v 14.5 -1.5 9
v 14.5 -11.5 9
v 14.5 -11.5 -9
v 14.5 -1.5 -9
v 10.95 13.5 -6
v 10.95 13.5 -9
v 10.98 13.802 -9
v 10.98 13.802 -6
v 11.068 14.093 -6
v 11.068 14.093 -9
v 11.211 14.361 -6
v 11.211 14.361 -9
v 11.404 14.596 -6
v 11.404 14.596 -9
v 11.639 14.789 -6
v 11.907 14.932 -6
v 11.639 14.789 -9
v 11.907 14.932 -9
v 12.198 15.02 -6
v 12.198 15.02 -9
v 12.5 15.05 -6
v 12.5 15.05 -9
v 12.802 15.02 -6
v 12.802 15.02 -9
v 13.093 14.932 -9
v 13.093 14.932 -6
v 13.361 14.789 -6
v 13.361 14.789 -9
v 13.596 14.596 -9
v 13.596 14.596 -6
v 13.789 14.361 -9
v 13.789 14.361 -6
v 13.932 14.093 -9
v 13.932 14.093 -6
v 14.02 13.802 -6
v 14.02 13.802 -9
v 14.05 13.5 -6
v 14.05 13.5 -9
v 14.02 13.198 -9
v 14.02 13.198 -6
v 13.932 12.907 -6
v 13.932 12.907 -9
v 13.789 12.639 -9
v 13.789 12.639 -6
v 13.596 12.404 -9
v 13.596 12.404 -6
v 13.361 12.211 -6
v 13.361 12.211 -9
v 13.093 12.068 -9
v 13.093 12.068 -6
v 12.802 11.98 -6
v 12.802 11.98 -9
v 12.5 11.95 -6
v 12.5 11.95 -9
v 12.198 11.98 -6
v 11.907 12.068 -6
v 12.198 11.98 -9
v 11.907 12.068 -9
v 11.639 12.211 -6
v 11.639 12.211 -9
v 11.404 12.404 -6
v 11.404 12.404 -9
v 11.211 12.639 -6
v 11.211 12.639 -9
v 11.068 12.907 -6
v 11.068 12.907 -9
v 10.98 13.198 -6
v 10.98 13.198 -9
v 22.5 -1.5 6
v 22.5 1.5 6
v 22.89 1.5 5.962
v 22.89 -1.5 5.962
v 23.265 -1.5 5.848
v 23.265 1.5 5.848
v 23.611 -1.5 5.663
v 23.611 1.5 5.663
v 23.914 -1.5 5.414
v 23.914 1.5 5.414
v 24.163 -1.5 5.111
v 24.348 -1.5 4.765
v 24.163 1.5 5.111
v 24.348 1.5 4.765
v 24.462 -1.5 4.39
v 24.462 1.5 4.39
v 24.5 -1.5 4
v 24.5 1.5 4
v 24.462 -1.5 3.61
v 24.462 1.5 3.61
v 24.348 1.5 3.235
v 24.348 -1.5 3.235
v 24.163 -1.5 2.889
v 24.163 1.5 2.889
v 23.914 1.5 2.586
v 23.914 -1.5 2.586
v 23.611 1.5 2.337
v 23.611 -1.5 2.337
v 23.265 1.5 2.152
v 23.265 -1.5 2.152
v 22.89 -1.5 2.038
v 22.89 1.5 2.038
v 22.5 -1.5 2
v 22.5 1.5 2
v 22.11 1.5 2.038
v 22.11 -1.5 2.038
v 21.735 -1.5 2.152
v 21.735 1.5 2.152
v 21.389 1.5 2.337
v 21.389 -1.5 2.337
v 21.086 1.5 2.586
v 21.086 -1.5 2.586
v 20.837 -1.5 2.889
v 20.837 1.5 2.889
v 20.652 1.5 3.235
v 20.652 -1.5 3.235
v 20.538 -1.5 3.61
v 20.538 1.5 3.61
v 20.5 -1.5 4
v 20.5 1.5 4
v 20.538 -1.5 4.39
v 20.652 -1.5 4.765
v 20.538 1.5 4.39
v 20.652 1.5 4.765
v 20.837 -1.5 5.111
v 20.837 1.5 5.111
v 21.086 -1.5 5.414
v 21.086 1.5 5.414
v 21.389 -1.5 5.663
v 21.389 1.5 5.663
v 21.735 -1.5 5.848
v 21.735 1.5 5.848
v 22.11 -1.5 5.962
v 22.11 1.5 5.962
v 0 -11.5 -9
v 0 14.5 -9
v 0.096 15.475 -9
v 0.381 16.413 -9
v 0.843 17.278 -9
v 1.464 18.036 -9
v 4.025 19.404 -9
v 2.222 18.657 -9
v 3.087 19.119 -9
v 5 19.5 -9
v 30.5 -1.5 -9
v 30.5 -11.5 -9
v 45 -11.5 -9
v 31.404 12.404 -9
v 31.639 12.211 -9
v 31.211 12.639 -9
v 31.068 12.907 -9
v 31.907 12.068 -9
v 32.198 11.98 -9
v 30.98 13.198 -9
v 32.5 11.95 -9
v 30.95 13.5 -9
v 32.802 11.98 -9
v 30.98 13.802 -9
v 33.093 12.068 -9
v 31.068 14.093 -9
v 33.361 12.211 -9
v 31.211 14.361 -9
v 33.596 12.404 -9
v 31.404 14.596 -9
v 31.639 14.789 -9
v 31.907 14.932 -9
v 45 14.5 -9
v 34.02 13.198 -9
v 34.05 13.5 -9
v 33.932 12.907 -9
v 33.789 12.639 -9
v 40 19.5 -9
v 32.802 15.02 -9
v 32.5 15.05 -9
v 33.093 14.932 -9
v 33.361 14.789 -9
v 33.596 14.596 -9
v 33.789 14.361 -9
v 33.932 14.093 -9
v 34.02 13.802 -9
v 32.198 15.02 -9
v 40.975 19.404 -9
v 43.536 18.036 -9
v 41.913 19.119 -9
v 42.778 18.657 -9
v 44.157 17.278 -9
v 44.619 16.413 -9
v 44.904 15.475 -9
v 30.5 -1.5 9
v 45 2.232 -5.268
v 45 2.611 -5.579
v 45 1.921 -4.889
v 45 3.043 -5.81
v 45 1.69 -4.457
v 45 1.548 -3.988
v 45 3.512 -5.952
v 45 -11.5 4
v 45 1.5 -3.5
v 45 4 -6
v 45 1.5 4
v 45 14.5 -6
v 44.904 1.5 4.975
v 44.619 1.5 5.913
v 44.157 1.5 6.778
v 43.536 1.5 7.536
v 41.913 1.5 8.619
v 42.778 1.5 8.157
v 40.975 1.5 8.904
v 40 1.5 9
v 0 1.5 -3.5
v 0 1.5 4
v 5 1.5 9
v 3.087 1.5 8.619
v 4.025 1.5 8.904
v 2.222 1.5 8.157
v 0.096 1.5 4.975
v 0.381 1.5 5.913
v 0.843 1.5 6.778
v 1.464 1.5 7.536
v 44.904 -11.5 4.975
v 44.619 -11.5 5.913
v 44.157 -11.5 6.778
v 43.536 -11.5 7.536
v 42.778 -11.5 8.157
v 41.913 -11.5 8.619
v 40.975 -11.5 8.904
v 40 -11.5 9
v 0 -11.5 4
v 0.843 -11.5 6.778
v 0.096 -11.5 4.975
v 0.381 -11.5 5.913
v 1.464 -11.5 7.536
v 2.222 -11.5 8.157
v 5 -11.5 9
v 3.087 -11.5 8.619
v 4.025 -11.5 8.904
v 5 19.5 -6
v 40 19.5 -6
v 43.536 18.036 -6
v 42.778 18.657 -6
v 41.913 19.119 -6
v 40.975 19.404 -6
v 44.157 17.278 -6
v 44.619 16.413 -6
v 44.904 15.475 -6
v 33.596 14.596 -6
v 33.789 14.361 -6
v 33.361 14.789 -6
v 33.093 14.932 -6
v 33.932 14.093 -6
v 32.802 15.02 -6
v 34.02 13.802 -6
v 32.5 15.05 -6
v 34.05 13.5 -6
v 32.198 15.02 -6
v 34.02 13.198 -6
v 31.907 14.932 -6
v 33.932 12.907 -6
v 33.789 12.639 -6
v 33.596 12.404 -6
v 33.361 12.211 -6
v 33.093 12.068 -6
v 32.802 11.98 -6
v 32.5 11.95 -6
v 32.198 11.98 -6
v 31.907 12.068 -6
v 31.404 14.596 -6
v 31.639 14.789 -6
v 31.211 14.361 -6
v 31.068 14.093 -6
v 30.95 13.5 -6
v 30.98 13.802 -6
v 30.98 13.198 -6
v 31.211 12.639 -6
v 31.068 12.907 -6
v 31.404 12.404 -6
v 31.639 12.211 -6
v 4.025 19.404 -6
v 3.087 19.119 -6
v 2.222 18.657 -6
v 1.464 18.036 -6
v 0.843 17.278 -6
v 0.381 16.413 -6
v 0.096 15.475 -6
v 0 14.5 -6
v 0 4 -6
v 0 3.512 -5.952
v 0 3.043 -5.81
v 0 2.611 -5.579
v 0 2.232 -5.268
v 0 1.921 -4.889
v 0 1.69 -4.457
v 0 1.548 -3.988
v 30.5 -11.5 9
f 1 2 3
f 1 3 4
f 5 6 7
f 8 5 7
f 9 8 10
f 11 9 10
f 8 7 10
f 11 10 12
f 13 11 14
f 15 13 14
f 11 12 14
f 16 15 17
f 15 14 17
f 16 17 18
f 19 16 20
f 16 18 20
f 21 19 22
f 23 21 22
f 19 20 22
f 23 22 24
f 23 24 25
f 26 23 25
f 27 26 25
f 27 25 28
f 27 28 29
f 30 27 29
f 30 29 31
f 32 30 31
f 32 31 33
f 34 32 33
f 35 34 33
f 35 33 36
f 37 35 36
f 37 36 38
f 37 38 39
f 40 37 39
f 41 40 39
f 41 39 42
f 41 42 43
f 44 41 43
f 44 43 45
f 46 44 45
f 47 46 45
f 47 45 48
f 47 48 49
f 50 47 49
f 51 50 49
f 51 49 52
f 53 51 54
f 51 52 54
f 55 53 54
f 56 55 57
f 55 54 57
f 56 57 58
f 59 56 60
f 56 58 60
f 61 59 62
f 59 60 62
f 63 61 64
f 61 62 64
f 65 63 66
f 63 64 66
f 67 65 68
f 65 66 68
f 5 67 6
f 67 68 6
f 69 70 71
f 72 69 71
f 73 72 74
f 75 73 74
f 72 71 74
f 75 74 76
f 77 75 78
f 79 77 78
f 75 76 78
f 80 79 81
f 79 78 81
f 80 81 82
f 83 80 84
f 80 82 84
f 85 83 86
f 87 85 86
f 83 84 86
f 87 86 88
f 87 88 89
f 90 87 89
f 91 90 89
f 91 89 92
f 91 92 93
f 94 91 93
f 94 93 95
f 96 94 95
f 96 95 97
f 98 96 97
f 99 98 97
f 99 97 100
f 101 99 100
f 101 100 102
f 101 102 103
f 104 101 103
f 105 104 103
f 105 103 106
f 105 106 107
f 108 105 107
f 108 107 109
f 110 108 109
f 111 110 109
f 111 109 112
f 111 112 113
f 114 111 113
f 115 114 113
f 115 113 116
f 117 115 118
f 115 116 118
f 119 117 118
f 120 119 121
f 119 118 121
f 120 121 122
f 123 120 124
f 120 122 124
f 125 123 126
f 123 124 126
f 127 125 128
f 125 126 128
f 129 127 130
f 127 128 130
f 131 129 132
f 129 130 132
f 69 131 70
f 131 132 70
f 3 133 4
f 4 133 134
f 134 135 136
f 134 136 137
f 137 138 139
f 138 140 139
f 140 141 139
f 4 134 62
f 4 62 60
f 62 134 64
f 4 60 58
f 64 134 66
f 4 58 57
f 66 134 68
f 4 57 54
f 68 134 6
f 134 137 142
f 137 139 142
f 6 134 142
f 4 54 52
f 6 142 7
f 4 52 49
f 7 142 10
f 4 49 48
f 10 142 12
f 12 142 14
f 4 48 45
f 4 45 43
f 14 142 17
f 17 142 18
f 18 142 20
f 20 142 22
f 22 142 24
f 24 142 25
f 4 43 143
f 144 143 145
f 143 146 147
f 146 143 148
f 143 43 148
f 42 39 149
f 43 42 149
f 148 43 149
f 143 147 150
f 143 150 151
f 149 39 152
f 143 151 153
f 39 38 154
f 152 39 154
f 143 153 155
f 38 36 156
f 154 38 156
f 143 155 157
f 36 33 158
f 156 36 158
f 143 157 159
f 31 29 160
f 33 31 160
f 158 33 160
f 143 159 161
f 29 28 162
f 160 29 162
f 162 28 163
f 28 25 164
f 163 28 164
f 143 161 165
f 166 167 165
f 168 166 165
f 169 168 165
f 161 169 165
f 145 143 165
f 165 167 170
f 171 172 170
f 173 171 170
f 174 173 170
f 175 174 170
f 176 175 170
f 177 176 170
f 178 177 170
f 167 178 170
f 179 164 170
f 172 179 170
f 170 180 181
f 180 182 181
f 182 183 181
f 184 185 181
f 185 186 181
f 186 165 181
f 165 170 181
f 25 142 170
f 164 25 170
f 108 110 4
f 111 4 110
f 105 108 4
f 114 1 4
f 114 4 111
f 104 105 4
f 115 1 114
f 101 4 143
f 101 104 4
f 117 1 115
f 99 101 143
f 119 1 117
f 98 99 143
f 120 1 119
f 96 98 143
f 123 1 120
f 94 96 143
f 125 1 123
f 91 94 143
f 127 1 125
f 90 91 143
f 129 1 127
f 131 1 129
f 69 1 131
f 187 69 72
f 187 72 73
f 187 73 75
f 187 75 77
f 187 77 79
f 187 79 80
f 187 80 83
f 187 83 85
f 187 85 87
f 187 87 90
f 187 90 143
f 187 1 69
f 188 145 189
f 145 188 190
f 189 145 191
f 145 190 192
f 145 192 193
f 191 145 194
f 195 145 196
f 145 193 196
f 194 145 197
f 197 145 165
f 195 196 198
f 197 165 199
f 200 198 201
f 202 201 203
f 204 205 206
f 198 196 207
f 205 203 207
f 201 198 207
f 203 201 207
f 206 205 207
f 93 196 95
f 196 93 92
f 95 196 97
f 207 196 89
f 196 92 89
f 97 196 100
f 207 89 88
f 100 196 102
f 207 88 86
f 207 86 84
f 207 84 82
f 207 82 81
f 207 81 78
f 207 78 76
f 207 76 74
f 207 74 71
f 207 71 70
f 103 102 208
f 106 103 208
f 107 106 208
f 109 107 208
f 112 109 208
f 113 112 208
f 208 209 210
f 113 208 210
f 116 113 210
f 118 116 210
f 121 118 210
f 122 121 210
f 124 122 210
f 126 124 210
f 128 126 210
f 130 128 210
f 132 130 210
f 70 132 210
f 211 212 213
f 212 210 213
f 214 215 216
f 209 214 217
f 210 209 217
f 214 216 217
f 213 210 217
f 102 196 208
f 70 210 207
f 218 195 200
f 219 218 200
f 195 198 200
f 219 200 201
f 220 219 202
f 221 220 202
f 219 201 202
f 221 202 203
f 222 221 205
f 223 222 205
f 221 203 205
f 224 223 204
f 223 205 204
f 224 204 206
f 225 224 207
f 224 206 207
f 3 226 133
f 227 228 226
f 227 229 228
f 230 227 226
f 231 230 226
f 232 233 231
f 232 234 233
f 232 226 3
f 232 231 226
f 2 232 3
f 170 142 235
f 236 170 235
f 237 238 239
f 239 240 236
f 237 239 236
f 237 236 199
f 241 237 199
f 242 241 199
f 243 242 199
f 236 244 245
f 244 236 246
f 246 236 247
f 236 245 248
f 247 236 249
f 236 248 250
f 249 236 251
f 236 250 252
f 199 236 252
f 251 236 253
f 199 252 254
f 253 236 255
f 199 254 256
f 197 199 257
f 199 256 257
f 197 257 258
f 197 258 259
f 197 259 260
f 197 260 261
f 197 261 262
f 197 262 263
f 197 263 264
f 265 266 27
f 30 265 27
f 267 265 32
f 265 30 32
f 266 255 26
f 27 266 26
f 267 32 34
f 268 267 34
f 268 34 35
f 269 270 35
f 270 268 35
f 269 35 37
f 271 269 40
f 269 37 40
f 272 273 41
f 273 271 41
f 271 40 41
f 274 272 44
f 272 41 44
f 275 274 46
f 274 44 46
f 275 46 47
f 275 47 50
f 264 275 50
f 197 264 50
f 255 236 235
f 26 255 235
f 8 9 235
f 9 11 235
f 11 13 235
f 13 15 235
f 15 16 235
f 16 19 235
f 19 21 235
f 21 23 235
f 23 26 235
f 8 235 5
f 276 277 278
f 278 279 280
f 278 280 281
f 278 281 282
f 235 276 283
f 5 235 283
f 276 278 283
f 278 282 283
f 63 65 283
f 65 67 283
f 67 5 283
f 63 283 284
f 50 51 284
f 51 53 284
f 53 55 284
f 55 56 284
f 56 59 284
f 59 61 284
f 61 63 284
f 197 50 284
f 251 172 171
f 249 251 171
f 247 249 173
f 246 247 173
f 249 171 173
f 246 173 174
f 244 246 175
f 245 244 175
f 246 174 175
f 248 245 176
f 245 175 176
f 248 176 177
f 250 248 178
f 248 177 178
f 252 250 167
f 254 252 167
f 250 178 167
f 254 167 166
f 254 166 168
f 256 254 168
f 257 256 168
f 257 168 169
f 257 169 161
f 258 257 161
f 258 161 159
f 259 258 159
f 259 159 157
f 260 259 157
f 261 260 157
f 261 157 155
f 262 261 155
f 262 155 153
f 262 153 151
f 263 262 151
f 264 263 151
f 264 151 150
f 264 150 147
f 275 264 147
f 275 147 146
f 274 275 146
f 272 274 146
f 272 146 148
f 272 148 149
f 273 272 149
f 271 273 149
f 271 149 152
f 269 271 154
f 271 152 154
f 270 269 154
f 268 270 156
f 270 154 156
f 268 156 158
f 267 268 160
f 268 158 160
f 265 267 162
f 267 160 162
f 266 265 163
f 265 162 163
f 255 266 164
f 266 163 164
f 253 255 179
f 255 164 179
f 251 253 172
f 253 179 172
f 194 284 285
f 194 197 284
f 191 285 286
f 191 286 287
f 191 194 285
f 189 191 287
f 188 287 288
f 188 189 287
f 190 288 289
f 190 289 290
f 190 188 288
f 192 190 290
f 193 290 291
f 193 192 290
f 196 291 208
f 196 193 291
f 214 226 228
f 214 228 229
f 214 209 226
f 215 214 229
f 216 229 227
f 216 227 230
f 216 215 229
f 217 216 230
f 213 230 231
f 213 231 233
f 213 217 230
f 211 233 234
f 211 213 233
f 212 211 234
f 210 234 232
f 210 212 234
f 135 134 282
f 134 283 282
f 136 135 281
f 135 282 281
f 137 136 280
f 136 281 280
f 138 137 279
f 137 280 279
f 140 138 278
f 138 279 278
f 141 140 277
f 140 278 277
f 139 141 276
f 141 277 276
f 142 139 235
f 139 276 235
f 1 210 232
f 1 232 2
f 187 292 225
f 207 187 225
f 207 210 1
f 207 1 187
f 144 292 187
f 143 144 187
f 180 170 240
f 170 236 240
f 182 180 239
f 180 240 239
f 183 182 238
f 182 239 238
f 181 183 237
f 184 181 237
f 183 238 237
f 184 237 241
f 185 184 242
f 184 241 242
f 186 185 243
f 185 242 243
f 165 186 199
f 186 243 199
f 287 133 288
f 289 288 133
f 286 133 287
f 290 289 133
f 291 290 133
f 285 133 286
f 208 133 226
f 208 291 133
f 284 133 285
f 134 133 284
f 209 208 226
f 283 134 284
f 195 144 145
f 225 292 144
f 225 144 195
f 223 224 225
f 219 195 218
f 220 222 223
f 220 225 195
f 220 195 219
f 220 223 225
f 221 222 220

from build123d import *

# Parameters (mm, degrees)
SALIENTE_EXTRUIR1_DEPTH = 45
REDONDEO1_R             = 2.5
CROQUIS2_R              = 2
CORTAR_EXTRUIR1_DEPTH   = 50.295030175
CROQUIS3_R              = 1.55
CORTAR_EXTRUIR2_DEPTH   = 53.242224302
CROQUIS4_W              = 45
CROQUIS4_H              = 18
SALIENTE_EXTRUIR2_DEPTH = 10
REDONDEO3_R             = 5
CROQUIS5_W              = 16
CROQUIS5_H              = 10
CORTAR_EXTRUIR3_DEPTH   = 53.242224302
REDONDEO4_R             = 5


with BuildPart() as part:
    # Croquis1 → Saliente-Extruir1 (new body)
    with BuildSketch(Plane(origin=(0, 0, 0), x_dir=(0, 0, -1), z_dir=(1, 0, 0))):
        Polygon((-9, -1.5), (9, -1.5), (9, 1.5), (9, 19.5), (6, 19.5), (6, 1.5), (-9, 1.5), align=None)
    extrude(amount=SALIENTE_EXTRUIR1_DEPTH)

    # Redondeo1
    redondeo1_edges = [part.edges().sort_by_distance(p)[0] for p in [
        (22.5, 1.5, -6),
    ]]
    fillet(redondeo1_edges, radius=REDONDEO1_R)

    # Croquis2 → Cortar-Extruir1 (cut, through all)
    with BuildSketch(Plane(origin=(0, 1.5, 0), x_dir=(1, 0, 0), z_dir=(0, 1, 0))):
        with Locations(Location((22.5, -4, 0), (0, 0, 270))):
            Circle(CROQUIS2_R)
    extrude(amount=-CORTAR_EXTRUIR1_DEPTH, mode=Mode.SUBTRACT)

    # Croquis3 → Cortar-Extruir2 (cut, through all)
    with BuildSketch(Plane(origin=(0, 0, -9), x_dir=(-1, 0, 0), z_dir=(0, 0, -1))):
        with Locations(Location((-32.5, 13.5, 0), (0, 0, 90))):
            Circle(CROQUIS3_R)
        with Locations((-12.5, 13.5)):
            Circle(CROQUIS3_R)
    extrude(amount=-CORTAR_EXTRUIR2_DEPTH, mode=Mode.SUBTRACT)

    # Croquis4 → Saliente-Extruir2 (add)
    with BuildSketch(Plane.XZ.offset(1.5)):
        with Locations((22.5, 0)):
            Rectangle(CROQUIS4_W, CROQUIS4_H)
    extrude(amount=SALIENTE_EXTRUIR2_DEPTH)

    # Redondeo3
    redondeo3_edges = [part.edges().sort_by_distance(p)[0] for p in [
        (45, -5, 9),
        (0, -5, 9),
    ]]
    fillet(redondeo3_edges, radius=REDONDEO3_R)

    # Croquis5 → Cortar-Extruir3 (cut, through all)
    with BuildSketch(Plane.XY.offset(9)):
        with Locations((22.5, -6.5)):
            Rectangle(CROQUIS5_W, CROQUIS5_H)
    extrude(amount=-CORTAR_EXTRUIR3_DEPTH, mode=Mode.SUBTRACT)

    # Redondeo4
    redondeo4_edges = [part.edges().sort_by_distance(p)[0] for p in [
        (45, 19.5, -7.5),
        (0, 19.5, -7.5),
    ]]
    fillet(redondeo4_edges, radius=REDONDEO4_R)


solid = part.part
